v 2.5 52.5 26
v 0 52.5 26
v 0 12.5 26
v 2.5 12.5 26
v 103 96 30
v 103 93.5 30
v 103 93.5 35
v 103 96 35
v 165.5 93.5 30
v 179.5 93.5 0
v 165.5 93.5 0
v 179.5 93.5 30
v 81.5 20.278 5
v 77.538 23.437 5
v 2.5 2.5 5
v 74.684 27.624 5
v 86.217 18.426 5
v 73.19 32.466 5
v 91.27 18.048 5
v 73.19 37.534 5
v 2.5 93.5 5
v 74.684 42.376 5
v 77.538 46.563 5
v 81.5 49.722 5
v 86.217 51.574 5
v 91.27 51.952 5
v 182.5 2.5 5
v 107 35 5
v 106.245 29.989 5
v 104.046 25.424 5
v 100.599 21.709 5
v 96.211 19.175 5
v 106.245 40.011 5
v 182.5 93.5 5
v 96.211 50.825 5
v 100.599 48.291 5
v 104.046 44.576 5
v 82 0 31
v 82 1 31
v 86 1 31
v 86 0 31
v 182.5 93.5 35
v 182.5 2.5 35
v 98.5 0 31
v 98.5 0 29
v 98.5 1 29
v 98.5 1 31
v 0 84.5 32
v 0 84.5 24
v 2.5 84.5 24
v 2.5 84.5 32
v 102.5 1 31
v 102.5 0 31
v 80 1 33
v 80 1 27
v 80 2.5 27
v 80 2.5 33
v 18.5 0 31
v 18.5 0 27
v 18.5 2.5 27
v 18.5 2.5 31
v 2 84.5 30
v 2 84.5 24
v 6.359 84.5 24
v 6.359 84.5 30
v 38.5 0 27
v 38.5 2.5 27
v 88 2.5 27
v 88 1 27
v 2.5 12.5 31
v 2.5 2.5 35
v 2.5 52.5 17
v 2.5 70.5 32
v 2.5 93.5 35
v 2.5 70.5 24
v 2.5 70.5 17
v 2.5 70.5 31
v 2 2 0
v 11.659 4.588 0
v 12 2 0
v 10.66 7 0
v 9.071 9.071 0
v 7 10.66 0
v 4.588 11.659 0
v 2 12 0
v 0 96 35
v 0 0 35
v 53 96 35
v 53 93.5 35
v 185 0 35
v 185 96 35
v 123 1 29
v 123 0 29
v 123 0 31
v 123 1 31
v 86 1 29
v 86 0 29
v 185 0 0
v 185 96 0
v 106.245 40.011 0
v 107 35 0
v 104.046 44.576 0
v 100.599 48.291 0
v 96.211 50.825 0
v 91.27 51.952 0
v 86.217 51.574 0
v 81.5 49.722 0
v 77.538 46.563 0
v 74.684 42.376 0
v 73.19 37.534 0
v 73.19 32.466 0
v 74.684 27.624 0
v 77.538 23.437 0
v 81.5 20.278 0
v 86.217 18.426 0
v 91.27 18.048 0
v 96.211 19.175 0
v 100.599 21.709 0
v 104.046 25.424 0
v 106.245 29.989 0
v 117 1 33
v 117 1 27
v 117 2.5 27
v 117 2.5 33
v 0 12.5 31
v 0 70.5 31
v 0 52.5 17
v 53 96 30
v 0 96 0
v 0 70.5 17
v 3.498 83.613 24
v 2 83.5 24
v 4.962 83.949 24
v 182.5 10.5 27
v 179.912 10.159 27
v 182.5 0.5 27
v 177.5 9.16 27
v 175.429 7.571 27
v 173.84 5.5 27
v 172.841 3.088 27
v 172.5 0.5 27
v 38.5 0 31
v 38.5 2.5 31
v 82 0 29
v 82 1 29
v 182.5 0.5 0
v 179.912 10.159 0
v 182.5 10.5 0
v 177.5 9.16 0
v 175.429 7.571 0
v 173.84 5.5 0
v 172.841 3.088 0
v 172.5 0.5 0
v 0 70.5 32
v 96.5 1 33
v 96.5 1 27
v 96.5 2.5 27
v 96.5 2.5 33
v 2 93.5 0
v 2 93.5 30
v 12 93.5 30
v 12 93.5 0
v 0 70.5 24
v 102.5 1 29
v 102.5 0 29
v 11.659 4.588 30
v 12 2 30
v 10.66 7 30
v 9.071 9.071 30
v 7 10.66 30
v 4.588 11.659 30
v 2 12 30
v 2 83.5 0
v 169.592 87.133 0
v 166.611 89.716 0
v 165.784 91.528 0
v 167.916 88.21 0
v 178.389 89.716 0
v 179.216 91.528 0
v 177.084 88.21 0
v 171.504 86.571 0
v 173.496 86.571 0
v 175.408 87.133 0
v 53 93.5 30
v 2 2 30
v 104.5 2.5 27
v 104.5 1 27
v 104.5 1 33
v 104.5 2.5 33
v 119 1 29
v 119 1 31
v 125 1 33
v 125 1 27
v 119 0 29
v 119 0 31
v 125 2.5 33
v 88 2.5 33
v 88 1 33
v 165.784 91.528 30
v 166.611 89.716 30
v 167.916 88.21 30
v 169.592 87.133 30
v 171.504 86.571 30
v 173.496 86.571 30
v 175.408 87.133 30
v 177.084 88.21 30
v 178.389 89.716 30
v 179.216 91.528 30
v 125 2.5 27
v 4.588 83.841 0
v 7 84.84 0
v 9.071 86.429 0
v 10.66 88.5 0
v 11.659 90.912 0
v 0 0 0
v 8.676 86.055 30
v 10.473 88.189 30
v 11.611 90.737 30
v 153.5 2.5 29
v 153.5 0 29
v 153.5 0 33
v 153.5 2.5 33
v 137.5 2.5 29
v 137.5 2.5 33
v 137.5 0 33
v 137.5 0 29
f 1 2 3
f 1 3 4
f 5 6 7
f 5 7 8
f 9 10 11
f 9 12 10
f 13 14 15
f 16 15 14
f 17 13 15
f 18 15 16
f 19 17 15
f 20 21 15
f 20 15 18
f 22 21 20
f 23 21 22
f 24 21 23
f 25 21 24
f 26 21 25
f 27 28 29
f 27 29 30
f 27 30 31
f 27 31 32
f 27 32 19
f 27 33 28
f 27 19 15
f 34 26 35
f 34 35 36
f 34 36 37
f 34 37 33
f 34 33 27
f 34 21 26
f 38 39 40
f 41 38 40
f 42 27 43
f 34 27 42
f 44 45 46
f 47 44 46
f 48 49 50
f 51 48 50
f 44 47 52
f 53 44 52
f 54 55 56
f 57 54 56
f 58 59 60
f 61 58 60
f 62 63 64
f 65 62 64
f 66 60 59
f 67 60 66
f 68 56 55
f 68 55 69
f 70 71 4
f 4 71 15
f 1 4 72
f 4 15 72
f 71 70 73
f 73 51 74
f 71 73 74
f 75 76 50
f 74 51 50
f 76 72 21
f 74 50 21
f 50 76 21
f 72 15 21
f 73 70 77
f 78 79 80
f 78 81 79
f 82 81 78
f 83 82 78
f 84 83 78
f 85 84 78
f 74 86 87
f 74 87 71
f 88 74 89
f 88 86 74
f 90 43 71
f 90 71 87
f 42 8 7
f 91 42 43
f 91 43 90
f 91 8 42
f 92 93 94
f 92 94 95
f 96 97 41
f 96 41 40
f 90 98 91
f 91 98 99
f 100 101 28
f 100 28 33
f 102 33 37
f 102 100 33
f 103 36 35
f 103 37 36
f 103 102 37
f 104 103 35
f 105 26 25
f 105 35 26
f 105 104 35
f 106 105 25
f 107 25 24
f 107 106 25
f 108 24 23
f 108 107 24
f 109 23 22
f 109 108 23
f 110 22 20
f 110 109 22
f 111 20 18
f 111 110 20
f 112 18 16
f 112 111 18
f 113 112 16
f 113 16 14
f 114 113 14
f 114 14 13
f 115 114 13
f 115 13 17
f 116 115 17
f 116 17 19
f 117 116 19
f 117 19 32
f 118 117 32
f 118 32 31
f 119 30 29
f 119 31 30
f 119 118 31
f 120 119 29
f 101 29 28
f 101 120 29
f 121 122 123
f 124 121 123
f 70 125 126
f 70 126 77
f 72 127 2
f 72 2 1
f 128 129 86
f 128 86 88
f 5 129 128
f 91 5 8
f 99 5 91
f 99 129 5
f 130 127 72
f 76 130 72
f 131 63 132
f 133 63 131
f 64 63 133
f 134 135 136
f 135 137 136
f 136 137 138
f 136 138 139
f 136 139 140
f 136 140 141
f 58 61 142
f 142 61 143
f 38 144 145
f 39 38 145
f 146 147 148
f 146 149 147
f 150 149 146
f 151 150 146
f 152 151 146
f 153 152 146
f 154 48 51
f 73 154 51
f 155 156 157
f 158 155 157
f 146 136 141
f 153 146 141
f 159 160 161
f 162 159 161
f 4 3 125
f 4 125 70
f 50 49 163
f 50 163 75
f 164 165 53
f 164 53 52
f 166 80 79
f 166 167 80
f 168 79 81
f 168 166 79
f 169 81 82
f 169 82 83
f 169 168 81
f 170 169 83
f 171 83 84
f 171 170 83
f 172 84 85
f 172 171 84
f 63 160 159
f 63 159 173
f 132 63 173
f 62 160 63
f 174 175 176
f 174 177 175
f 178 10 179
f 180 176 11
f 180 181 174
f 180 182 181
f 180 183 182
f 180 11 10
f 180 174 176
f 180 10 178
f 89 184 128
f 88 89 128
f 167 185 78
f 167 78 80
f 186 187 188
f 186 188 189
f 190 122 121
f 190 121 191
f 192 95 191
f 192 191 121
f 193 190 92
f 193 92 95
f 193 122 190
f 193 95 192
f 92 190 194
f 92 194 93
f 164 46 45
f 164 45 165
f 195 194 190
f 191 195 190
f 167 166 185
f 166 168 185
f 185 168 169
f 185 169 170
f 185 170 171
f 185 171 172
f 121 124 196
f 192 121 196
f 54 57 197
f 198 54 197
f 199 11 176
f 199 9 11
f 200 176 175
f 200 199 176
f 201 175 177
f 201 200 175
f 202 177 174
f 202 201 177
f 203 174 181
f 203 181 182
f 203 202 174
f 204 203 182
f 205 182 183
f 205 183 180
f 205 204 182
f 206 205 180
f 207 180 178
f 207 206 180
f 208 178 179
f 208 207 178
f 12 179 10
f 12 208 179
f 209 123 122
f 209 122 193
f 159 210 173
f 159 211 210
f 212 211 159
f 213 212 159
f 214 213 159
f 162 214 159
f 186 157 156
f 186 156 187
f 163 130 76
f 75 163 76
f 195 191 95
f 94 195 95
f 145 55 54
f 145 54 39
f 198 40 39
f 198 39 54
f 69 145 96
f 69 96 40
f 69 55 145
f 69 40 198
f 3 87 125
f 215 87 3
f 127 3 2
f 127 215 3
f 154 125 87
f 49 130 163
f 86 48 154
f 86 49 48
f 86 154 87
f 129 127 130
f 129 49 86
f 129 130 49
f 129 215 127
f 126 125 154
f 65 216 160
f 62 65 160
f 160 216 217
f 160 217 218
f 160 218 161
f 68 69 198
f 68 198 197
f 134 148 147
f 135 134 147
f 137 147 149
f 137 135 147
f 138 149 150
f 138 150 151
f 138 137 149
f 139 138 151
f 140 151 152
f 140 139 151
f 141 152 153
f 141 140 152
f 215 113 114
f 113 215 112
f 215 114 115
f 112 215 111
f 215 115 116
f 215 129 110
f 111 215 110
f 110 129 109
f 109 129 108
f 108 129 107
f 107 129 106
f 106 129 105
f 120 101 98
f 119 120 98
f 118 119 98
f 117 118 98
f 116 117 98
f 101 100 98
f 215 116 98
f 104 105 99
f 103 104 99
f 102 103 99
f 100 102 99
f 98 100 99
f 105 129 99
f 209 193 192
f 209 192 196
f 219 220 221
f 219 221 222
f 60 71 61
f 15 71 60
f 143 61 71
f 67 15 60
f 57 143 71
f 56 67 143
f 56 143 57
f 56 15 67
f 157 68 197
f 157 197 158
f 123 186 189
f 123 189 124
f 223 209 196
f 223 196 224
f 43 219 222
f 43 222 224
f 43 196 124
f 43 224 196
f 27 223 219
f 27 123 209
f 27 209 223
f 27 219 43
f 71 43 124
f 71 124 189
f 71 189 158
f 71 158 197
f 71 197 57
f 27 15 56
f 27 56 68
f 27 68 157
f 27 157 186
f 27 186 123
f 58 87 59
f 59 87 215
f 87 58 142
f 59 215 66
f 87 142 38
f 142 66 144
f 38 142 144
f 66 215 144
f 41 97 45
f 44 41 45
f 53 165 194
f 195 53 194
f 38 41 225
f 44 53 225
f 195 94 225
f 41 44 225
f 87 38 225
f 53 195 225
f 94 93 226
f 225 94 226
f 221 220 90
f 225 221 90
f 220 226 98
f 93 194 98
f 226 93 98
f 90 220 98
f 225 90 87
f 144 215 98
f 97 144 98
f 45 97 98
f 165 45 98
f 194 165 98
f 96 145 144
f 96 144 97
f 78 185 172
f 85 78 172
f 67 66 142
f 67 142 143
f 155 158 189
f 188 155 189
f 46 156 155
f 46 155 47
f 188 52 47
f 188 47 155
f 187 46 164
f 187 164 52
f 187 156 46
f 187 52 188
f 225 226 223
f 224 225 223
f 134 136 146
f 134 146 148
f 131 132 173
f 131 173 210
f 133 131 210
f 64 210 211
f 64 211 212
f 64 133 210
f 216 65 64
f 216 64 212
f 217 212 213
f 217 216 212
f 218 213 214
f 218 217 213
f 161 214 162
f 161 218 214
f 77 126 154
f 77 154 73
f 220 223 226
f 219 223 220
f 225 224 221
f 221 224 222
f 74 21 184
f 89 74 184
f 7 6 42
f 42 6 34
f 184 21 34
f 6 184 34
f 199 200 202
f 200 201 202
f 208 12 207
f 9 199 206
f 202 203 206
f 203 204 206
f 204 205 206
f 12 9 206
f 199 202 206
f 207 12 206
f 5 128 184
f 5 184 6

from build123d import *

# Parameters (mm, degrees)
CYLINDER_W                  = 10
CYLINDER_H                  = 30
CYLINDER_ANGLE              = 90
CYLINDER002_W               = 7
CYLINDER002_H               = 30
CYLINDER002_ANGLE           = 180
CYLINDER003_W               = 10
CYLINDER003_H               = 27
CYLINDER003_ANGLE           = 90
CYLINDER003_PLACEMENT_ANGLE = 90
BOX002_W                    = 10
BOX002_H                    = 14
BOX002_DEPTH                = 8
CYLINDER001_W               = 10
CYLINDER001_H               = 30
CYLINDER001_ANGLE           = 90
CYLINDER001_PLACEMENT_ANGLE = -90
CYLINDER004_R               = 17
CYLINDER004_DEPTH           = 10
BOX012_W                    = 8
BOX012_H                    = 2
BOX012_DEPTH                = 6
BOX011_W                    = 8
BOX011_H                    = 2
BOX011_DEPTH                = 6
BOX013_W                    = 8
BOX013_H                    = 2
BOX013_DEPTH                = 6
BOX008_W                    = 4
BOX008_H                    = 4
BOX008_DEPTH                = 2
BOX009_W                    = 4
BOX009_H                    = 4
BOX009_DEPTH                = 2
BOX007_W                    = 4
BOX007_H                    = 4
BOX007_DEPTH                = 2
BOX006_W                    = 20
BOX006_H                    = 10
BOX006_DEPTH                = 4
BOX005_W                    = 50
BOX005_H                    = 10
BOX005_DEPTH                = 5
BOX004_W                    = 10
BOX004_H                    = 42
BOX004_DEPTH                = 5
BOX003_W                    = 10
BOX003_H                    = 18
BOX003_DEPTH                = 14
BOX010_W                    = 16
BOX010_H                    = 10
BOX010_DEPTH                = 4
BOX001_W                    = 180
BOX001_H                    = 91
BOX001_DEPTH                = 30
BOX_W                       = 185
BOX_H                       = 96
BOX_DEPTH                   = 35


with BuildPart() as standoffbr:
    # Cylinder → Cylinder (revolve)
    with BuildSketch(Plane(origin=(2, 2, 0), x_dir=(1, 0, 0), z_dir=(0, -1, 0))):
        with Locations((5, 15)):
            Rectangle(CYLINDER_W, CYLINDER_H)
    revolve(axis=Axis((2, 2, 0), (0, 0, 1)), revolution_arc=CYLINDER_ANGLE)


with BuildPart() as standofftl:
    # Cylinder002 → Cylinder002 (revolve)
    with BuildSketch(Plane(origin=(172.5, 93.5, 0), x_dir=(-1, 0, 0), z_dir=(0, 1, 0))):
        with Locations((3.5, 15)):
            Rectangle(CYLINDER002_W, CYLINDER002_H)
    revolve(axis=Axis((172.5, 93.5, 0), (0, 0, 1)), revolution_arc=CYLINDER002_ANGLE)


with BuildPart() as standofftr:
    # Cylinder003 → Cylinder003 (revolve)
    with BuildSketch(Plane.XZ):
        with Locations((5, 13.5)):
            Rectangle(CYLINDER003_W, CYLINDER003_H)
    revolve(axis=Axis((0, 0, 0), (0, 0, 1)), revolution_arc=CYLINDER003_ANGLE)


with BuildPart() as standofftr_1:
    # Cylinder003 placement: moved
    add(standofftr.part.moved(Location((182.5, 0.5, 0))).rotate(Axis((182.5, 0.5, 0), (0, 0, 1)), CYLINDER003_PLACEMENT_ANGLE))


with BuildPart() as headphone:
    # Box002 → Box002 (new body)
    with BuildSketch(Plane(origin=(-1, 70.5, 24), x_dir=(1, 0, 0), z_dir=(0, 0, 1))):
        with Locations((5, 7)):
            Rectangle(BOX002_W, BOX002_H)
    extrude(amount=BOX002_DEPTH)


with BuildPart() as standoffbl:
    # Cylinder001 → Cylinder001 (revolve)
    with BuildSketch(Plane.XZ):
        with Locations((5, 15)):
            Rectangle(CYLINDER001_W, CYLINDER001_H)
    revolve(axis=Axis((0, 0, 0), (0, 0, 1)), revolution_arc=CYLINDER001_ANGLE)


with BuildPart() as standoffbl_1:
    # Cylinder001 placement: moved
    add(standoffbl.part.moved(Location((2, 93.5, 0))).rotate(Axis((2, 93.5, 0), (0, 0, 1)), CYLINDER001_PLACEMENT_ANGLE))

    # Cut003: cut Headphone
    add(headphone.part, mode=Mode.SUBTRACT)


with BuildPart() as fanhole:
    # Cylinder004 → Cylinder004 (new body)
    with BuildSketch(Plane(origin=(90, 35, -3), x_dir=(1, 0, 0), z_dir=(0, 0, 1))):
        Circle(CYLINDER004_R)
    extrude(amount=CYLINDER004_DEPTH)


with BuildPart() as volumeupbotton:
    # Box012 → Box012 (new body)
    with BuildSketch(Plane(origin=(96.5, 1, 27), x_dir=(1, 0, 0), z_dir=(0, 0, 1))):
        with Locations((4, 1)):
            Rectangle(BOX012_W, BOX012_H)
    extrude(amount=BOX012_DEPTH)


with BuildPart() as voldownbutton:
    # Box011 → Box011 (new body)
    with BuildSketch(Plane(origin=(80, 1, 27), x_dir=(1, 0, 0), z_dir=(0, 0, 1))):
        with Locations((4, 1)):
            Rectangle(BOX011_W, BOX011_H)
    extrude(amount=BOX011_DEPTH)


with BuildPart() as buttoncutouts:
    # Box013 → Box013 (new body)
    with BuildSketch(Plane(origin=(117, 1, 27), x_dir=(1, 0, 0), z_dir=(0, 0, 1))):
        with Locations((4, 1)):
            Rectangle(BOX013_W, BOX013_H)
    extrude(amount=BOX013_DEPTH)

    # Fusion001: union VolumeUpBotton, VolDownButton
    add(volumeupbotton.part)
    add(voldownbutton.part)


with BuildPart() as volup:
    # Box008 → Box008 (new body)
    with BuildSketch(Plane(origin=(98.5, -2, 29), x_dir=(1, 0, 0), z_dir=(0, 0, 1))):
        with Locations((2, 2)):
            Rectangle(BOX008_W, BOX008_H)
    extrude(amount=BOX008_DEPTH)


with BuildPart() as power:
    # Box009 → Box009 (new body)
    with BuildSketch(Plane(origin=(119, -2, 29), x_dir=(1, 0, 0), z_dir=(0, 0, 1))):
        with Locations((2, 2)):
            Rectangle(BOX009_W, BOX009_H)
    extrude(amount=BOX009_DEPTH)


with BuildPart() as voldown:
    # Box007 → Box007 (new body)
    with BuildSketch(Plane(origin=(82, -2, 29), x_dir=(1, 0, 0), z_dir=(0, 0, 1))):
        with Locations((2, 2)):
            Rectangle(BOX007_W, BOX007_H)
    extrude(amount=BOX007_DEPTH)


with BuildPart() as smartcard:
    # Box006 → Box006 (new body)
    with BuildSketch(Plane(origin=(18.5, -1, 27), x_dir=(1, 0, 0), z_dir=(0, 0, 1))):
        with Locations((10, 5)):
            Rectangle(BOX006_W, BOX006_H)
    extrude(amount=BOX006_DEPTH)


with BuildPart() as hwswitches:
    # Box005 → Box005 (new body)
    with BuildSketch(Plane(origin=(53, 87, 30), x_dir=(1, 0, 0), z_dir=(0, 0, 1))):
        with Locations((25, 5)):
            Rectangle(BOX005_W, BOX005_H)
    extrude(amount=BOX005_DEPTH)


with BuildPart() as ports:
    # Box004 → Box004 (new body)
    with BuildSketch(Plane(origin=(-1, 12.5, 26), x_dir=(1, 0, 0), z_dir=(0, 0, 1))):
        with Locations((5, 21)):
            Rectangle(BOX004_W, BOX004_H)
    extrude(amount=BOX004_DEPTH)


with BuildPart() as rj45:
    # Box003 → Box003 (new body)
    with BuildSketch(Plane(origin=(-1, 52.5, 17), x_dir=(1, 0, 0), z_dir=(0, 0, 1))):
        with Locations((5, 9)):
            Rectangle(BOX003_W, BOX003_H)
    extrude(amount=BOX003_DEPTH)


with BuildPart() as allcutouts:
    # Box010 → Box010 (new body)
    with BuildSketch(Plane(origin=(137.5, -1, 29), x_dir=(1, 0, 0), z_dir=(0, 0, 1))):
        with Locations((8, 5)):
            Rectangle(BOX010_W, BOX010_H)
    extrude(amount=BOX010_DEPTH)

    # Fusion: union VolUp, Power, VolDown, SmartCard, HWSwitches, Ports, RJ45, Headphone
    add(volup.part)
    add(power.part)
    add(voldown.part)
    add(smartcard.part)
    add(hwswitches.part)
    add(ports.part)
    add(rj45.part)
    add(headphone.part)


with BuildPart() as inside:
    # Box001 → Box001 (new body)
    with BuildSketch(Plane(origin=(2.5, 2.5, 5), x_dir=(1, 0, 0), z_dir=(0, 0, 1))):
        with Locations((90, 45.5)):
            Rectangle(BOX001_W, BOX001_H)
    extrude(amount=BOX001_DEPTH)


with BuildPart() as cut004:
    # Box → Box (new body)
    with BuildSketch(Plane.XY):
        with Locations((92.5, 48)):
            Rectangle(BOX_W, BOX_H)
    extrude(amount=BOX_DEPTH)

    # Cut: cut Inside
    add(inside.part, mode=Mode.SUBTRACT)

    # Cut001: cut AllCutouts
    add(allcutouts.part, mode=Mode.SUBTRACT)

    # Cut002: cut ButtonCutouts
    add(buttoncutouts.part, mode=Mode.SUBTRACT)

    # Cut004: cut FanHole
    add(fanhole.part, mode=Mode.SUBTRACT)


solid = Compound([standoffbr.part, standofftl.part, standofftr_1.part, standoffbl_1.part, cut004.part])
